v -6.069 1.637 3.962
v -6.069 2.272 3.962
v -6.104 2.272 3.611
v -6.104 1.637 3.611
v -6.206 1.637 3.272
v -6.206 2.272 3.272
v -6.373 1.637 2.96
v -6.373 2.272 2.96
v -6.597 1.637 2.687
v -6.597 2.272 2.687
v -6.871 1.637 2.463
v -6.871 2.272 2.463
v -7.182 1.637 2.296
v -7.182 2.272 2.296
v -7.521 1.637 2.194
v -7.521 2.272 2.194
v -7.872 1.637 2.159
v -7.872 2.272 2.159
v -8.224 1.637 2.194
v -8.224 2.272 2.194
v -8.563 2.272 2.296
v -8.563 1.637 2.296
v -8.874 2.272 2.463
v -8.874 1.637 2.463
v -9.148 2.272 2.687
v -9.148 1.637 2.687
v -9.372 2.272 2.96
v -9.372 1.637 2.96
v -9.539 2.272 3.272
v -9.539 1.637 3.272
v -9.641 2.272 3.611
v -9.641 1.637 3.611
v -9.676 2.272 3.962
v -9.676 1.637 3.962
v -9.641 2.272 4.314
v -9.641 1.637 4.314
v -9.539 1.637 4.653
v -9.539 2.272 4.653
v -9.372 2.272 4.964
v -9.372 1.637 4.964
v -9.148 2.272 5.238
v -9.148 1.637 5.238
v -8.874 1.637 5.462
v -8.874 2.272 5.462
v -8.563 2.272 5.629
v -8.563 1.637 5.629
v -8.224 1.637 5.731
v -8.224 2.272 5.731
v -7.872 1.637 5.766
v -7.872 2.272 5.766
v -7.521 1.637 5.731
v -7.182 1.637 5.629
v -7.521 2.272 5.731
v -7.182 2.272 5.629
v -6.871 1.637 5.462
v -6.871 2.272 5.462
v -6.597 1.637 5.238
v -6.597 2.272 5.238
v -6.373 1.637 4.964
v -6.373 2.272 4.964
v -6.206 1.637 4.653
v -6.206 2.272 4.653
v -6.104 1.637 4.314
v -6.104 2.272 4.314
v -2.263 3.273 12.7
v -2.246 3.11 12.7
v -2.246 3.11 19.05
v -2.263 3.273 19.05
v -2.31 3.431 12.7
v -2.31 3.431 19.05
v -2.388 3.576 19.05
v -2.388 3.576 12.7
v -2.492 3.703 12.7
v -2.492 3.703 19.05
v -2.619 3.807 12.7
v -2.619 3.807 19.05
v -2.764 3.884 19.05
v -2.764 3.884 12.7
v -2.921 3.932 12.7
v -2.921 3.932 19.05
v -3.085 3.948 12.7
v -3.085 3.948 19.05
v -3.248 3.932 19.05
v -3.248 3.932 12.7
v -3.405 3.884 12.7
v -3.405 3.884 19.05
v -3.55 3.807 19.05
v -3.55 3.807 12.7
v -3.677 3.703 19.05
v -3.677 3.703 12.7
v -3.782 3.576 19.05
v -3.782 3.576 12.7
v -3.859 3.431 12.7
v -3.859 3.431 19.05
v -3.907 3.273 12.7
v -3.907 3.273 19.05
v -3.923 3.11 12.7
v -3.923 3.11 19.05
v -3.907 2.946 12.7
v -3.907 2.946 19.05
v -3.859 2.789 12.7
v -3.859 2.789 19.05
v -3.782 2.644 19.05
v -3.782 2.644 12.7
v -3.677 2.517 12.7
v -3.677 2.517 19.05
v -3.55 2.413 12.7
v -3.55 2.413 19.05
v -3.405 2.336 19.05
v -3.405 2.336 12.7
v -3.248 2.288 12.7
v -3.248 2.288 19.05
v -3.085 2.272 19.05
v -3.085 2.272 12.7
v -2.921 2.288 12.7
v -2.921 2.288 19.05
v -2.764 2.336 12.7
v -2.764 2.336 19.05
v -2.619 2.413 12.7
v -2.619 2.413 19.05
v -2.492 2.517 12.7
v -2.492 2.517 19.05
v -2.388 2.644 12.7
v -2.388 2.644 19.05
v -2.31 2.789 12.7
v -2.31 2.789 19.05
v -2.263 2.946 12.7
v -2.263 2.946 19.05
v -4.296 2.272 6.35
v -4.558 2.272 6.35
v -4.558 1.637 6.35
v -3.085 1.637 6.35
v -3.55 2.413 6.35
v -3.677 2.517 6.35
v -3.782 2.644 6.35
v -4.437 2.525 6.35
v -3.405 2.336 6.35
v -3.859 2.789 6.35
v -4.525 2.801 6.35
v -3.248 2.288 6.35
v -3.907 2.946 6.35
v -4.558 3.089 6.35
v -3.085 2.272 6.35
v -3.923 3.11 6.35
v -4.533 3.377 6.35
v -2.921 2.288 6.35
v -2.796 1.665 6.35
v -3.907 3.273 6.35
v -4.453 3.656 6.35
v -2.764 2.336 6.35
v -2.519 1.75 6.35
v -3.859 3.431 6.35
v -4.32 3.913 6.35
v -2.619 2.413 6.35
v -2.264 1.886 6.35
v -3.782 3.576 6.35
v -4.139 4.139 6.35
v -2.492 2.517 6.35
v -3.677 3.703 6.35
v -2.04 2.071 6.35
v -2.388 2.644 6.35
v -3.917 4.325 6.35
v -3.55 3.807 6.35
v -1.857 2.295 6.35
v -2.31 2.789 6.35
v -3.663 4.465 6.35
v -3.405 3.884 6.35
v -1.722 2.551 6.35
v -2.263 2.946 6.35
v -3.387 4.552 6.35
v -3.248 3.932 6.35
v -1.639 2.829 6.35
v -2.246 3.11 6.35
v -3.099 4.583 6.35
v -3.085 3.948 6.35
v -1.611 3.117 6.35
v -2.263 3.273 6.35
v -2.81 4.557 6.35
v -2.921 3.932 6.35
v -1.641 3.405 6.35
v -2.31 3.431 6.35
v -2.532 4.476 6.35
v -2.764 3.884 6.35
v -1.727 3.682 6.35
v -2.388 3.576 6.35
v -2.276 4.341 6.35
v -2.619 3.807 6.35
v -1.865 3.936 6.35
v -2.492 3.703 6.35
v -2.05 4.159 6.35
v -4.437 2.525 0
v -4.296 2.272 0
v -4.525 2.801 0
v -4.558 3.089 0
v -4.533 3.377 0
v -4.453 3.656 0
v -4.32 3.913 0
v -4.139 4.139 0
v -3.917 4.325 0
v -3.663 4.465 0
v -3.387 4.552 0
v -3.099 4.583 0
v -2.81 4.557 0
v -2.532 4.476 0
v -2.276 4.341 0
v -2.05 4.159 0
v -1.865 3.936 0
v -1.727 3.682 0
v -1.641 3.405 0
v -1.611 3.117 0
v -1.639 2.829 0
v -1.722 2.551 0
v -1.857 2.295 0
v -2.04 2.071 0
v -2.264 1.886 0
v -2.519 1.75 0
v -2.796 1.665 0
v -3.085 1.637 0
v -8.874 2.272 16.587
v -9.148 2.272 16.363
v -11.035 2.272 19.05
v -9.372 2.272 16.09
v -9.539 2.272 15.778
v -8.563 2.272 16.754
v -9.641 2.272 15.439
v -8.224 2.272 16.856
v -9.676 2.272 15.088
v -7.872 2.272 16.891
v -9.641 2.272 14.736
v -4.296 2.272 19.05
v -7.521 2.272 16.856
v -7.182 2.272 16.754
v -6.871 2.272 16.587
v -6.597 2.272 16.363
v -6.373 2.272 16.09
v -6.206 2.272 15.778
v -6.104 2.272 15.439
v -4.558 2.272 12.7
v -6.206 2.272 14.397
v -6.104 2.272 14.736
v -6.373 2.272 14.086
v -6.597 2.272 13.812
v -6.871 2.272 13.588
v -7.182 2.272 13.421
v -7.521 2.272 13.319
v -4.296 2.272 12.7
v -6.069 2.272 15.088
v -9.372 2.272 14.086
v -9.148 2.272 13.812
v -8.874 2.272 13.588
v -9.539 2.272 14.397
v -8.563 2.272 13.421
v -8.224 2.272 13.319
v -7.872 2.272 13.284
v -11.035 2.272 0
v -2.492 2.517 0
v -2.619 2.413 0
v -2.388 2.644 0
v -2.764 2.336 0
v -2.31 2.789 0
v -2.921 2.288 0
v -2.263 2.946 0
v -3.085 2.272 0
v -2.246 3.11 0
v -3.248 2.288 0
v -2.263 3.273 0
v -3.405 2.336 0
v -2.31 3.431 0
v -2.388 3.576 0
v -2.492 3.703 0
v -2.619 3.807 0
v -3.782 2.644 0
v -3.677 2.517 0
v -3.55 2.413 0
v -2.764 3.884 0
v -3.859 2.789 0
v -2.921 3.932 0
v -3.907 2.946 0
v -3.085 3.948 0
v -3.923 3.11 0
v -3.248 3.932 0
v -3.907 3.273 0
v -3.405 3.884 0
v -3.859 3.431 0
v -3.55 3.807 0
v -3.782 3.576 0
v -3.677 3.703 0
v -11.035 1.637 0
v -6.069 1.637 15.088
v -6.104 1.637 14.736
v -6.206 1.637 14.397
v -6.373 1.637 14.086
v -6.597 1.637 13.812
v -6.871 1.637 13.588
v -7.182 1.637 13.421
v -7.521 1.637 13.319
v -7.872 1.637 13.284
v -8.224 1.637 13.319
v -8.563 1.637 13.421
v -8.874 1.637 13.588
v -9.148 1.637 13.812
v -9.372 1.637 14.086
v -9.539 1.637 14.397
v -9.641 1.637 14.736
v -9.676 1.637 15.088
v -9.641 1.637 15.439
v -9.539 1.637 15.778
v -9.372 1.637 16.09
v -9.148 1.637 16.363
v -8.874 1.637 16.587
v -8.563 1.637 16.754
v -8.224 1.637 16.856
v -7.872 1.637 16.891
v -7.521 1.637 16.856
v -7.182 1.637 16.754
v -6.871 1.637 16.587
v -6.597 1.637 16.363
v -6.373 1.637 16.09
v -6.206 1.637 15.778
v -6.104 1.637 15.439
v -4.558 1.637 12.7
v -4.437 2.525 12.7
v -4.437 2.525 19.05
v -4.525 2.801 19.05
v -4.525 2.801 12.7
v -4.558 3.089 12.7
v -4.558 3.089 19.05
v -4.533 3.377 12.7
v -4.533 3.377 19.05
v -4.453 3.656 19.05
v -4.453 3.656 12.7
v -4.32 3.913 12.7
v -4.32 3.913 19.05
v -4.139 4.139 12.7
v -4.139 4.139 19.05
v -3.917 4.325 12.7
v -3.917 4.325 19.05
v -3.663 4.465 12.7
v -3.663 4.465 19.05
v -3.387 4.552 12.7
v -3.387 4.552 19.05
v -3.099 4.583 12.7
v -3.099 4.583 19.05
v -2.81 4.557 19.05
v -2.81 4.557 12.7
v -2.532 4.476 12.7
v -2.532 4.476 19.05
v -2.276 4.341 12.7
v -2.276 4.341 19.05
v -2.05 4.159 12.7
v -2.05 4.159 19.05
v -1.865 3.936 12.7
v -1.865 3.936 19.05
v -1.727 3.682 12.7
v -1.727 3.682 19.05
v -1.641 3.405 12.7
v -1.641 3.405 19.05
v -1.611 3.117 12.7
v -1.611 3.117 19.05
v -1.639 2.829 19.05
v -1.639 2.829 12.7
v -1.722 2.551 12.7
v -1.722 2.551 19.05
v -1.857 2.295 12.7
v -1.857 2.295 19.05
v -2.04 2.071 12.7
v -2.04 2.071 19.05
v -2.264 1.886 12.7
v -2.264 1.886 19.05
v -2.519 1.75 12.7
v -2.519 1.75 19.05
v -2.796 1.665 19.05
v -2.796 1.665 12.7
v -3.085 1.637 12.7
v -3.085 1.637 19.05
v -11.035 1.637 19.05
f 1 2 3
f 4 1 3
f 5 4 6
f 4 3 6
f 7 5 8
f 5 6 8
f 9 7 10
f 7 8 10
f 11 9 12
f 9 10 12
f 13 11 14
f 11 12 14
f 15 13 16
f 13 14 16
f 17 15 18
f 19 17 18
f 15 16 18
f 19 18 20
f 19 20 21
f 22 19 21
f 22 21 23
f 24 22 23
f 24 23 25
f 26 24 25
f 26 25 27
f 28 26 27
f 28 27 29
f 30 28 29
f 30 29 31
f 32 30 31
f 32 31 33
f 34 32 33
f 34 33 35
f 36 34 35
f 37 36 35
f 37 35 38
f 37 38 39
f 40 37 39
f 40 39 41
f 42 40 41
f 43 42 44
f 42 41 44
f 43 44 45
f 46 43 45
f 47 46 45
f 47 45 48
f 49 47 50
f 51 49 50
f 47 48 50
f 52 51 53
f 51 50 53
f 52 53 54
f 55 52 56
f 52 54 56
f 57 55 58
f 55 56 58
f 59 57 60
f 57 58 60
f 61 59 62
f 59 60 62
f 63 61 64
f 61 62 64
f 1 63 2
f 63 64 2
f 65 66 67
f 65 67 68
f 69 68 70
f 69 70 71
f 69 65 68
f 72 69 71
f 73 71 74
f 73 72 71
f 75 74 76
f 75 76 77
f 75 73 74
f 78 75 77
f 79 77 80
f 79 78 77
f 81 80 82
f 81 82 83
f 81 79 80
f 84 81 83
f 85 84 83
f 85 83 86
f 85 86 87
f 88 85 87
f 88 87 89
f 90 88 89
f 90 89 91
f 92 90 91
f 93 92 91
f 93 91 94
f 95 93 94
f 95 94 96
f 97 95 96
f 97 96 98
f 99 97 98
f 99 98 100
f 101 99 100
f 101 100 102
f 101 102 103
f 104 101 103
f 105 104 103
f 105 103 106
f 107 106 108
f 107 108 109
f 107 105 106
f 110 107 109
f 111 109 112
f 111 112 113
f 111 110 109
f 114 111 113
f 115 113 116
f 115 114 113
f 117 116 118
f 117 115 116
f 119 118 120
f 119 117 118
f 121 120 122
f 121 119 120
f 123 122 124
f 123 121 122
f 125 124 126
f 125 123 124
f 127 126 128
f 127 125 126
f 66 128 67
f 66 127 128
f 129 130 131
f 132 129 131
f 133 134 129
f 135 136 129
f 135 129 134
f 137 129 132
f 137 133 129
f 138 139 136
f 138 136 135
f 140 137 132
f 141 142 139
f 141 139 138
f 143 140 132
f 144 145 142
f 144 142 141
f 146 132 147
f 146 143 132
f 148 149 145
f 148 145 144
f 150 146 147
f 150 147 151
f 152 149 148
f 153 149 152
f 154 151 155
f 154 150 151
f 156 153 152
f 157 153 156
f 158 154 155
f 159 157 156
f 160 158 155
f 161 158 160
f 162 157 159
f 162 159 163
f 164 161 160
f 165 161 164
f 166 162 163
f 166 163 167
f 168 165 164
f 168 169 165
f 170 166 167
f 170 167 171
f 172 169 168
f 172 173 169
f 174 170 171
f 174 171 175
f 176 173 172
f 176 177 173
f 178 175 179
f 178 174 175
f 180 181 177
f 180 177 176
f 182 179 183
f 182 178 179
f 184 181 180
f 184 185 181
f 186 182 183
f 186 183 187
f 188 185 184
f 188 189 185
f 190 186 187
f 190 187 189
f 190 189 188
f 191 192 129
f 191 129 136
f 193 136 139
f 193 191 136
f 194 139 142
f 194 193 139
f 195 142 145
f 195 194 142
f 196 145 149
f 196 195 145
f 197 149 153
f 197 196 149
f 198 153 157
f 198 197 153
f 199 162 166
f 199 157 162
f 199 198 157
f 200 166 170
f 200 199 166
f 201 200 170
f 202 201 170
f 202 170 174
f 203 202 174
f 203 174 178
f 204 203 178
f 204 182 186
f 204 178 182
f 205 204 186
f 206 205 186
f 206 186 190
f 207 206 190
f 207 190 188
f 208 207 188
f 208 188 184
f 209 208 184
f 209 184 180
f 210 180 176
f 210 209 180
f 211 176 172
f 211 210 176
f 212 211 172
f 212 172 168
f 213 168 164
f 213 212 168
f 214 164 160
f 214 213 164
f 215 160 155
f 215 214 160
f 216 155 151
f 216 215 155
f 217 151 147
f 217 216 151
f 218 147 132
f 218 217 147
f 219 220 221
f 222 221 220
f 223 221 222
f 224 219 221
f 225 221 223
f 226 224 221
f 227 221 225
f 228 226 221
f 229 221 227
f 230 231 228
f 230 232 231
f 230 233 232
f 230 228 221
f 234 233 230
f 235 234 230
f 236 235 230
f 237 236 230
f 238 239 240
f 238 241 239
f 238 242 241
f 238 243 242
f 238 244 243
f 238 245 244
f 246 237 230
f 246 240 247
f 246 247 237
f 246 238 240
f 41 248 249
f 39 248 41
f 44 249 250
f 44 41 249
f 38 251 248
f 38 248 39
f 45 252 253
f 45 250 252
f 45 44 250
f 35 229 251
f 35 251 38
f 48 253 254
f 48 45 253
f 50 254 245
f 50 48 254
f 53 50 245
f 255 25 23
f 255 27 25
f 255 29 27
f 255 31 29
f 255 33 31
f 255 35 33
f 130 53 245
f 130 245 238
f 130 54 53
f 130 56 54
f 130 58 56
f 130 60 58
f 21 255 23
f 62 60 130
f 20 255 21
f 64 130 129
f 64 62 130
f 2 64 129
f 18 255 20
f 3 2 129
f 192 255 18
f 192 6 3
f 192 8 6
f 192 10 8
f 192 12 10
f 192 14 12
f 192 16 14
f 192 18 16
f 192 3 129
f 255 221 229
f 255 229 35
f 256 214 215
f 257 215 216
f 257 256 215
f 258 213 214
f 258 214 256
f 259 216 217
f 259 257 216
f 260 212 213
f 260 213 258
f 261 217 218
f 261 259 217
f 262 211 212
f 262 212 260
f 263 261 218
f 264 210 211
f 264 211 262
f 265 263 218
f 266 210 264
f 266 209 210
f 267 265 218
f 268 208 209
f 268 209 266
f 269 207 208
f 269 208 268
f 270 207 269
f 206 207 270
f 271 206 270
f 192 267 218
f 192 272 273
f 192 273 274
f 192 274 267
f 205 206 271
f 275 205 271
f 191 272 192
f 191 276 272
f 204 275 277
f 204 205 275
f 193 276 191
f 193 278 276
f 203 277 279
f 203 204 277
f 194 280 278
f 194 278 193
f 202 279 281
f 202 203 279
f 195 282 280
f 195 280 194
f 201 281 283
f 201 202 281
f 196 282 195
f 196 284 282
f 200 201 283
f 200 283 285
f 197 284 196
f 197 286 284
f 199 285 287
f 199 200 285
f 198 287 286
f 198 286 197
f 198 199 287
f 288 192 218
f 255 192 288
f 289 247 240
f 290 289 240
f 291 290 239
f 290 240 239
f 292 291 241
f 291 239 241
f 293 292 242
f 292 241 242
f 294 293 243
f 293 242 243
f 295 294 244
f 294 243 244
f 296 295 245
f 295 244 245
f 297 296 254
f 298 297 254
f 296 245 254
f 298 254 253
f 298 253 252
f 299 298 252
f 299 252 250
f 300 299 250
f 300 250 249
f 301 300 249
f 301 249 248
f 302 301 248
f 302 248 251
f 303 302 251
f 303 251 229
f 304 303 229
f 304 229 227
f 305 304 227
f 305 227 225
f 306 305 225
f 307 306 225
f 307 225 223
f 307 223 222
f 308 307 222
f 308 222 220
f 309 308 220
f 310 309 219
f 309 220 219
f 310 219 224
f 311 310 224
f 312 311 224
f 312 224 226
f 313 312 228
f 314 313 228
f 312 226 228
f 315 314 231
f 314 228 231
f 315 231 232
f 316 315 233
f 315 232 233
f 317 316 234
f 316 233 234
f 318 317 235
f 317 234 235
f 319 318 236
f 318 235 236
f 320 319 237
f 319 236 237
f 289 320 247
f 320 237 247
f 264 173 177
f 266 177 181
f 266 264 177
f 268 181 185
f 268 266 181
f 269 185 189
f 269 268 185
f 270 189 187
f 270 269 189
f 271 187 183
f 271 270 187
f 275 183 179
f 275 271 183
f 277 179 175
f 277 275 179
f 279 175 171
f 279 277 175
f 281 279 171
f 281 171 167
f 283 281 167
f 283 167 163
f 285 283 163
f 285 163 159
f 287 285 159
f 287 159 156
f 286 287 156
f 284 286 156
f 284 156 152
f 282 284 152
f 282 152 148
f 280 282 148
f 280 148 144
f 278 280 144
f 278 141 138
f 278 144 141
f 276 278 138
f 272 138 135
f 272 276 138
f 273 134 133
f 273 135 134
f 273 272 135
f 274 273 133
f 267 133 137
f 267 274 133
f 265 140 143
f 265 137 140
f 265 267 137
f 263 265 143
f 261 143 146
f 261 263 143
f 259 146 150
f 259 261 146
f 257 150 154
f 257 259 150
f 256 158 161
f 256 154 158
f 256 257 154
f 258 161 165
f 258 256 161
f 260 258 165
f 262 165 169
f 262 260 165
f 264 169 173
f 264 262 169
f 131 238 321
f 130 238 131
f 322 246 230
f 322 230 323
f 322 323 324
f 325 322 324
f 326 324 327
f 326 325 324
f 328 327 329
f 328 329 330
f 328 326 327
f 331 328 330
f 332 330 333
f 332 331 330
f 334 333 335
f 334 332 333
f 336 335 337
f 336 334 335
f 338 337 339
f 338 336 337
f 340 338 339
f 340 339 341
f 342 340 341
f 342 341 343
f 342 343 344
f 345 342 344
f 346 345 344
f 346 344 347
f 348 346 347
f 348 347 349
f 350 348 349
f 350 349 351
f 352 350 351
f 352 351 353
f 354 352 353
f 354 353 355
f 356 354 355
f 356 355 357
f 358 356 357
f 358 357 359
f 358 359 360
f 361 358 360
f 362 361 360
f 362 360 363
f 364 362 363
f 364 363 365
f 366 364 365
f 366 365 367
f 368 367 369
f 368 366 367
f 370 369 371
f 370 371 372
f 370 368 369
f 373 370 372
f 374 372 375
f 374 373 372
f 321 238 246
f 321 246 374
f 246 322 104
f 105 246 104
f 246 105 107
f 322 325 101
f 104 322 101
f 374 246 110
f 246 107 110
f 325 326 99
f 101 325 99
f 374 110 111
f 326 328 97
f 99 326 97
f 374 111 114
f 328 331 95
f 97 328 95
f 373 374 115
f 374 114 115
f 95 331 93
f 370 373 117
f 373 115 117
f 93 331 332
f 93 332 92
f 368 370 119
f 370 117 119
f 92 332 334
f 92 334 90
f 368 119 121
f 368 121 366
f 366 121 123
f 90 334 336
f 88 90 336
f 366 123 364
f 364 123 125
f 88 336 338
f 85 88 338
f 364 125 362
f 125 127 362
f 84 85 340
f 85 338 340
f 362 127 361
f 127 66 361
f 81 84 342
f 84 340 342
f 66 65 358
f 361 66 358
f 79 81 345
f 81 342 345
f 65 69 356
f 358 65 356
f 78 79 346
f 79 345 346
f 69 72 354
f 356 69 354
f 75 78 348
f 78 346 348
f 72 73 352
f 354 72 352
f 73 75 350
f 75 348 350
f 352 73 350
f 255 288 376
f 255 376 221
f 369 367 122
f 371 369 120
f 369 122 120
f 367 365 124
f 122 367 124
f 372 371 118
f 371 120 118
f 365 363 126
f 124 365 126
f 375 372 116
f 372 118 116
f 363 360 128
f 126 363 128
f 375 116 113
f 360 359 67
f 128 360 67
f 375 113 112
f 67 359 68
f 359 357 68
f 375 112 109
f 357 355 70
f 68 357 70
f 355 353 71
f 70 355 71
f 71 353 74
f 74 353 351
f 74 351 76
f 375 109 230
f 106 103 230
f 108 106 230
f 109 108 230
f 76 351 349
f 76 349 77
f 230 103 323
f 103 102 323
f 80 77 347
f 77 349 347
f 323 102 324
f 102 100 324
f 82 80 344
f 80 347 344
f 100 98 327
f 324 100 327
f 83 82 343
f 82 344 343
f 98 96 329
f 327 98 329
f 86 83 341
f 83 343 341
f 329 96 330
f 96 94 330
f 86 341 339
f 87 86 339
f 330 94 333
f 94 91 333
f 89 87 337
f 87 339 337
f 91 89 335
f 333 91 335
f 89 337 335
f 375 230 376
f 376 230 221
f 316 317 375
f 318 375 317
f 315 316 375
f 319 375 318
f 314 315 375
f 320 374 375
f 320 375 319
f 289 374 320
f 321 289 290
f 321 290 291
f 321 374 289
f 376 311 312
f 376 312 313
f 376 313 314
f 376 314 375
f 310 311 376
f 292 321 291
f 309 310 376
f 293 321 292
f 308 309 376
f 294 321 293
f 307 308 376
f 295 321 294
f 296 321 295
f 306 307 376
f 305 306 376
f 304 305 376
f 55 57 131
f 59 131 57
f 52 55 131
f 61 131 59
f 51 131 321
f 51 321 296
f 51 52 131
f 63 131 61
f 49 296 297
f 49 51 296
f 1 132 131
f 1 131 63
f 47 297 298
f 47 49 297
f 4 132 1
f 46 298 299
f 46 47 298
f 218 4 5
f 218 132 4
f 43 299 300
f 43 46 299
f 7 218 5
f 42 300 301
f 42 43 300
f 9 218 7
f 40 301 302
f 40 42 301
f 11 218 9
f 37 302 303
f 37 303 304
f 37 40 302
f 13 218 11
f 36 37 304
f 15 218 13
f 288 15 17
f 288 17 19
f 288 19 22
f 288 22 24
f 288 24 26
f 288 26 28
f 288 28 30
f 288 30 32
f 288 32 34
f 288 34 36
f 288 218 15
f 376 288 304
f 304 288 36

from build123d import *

# Parameters (mm, degrees)
SKETCH1_R               = 0.8382
BOSS_EXTRUDE1_DEPTH     = 19.05
SKETCH7_R               = 1.8034
CUT_EXTRUDE5_DEPTH      = 2.54
SKETCH8_W               = 2.9464
SKETCH8_H               = 6.35
CUT_EXTRUDE6_DEPTH      = 3.3114
CUT_EXTRUDE6_DEPTH_BACK = 1.635


with BuildPart() as part:
    # Sketch1 → Boss-Extrude1 (new body)
    with BuildSketch(Plane.XY):
        with BuildLine():
            Line((-11.0348776, 1.636724806), (-11.0348776, 2.271724806))
            Line((-11.0348776, 2.271724806), (-4.296180386, 2.271724806))
            ThreePointArc((-4.296180386, 2.271724806), (-2.400761669, 4.41475324), (-3.0846776, 1.636724806))
            Line((-3.0846776, 1.636724806), (-11.0348776, 1.636724806))
        make_face()
        with Locations((-3.0846776, 3.109924806)):
            Circle(SKETCH1_R, mode=Mode.SUBTRACT)
    extrude(amount=BOSS_EXTRUDE1_DEPTH)

    # Sketch7 → Cut-Extrude5 (cut)
    with BuildSketch(Plane(origin=(0, 2.271724806, 0), x_dir=(1, 0, 0), z_dir=(0, 1, 0))):
        with Locations((-7.872478375, -3.9624)):
            Circle(SKETCH7_R)
        with Locations((-7.872478375, -15.0876)):
            Circle(SKETCH7_R)
    extrude(amount=-CUT_EXTRUDE5_DEPTH, mode=Mode.SUBTRACT)

    # Sketch8 → Cut-Extrude6 (cut, two sides)
    with BuildSketch(Plane(origin=(0, 2.271724806, 0), x_dir=(1, 0, 0), z_dir=(0, 1, 0))) as cut_extrude6_sk:
        with Locations((-3.0846776, -9.525)):
            Rectangle(SKETCH8_W, SKETCH8_H)
    extrude(amount=CUT_EXTRUDE6_DEPTH, mode=Mode.SUBTRACT)
    extrude(cut_extrude6_sk.sketch, amount=-CUT_EXTRUDE6_DEPTH_BACK, mode=Mode.SUBTRACT)


solid = part.part
